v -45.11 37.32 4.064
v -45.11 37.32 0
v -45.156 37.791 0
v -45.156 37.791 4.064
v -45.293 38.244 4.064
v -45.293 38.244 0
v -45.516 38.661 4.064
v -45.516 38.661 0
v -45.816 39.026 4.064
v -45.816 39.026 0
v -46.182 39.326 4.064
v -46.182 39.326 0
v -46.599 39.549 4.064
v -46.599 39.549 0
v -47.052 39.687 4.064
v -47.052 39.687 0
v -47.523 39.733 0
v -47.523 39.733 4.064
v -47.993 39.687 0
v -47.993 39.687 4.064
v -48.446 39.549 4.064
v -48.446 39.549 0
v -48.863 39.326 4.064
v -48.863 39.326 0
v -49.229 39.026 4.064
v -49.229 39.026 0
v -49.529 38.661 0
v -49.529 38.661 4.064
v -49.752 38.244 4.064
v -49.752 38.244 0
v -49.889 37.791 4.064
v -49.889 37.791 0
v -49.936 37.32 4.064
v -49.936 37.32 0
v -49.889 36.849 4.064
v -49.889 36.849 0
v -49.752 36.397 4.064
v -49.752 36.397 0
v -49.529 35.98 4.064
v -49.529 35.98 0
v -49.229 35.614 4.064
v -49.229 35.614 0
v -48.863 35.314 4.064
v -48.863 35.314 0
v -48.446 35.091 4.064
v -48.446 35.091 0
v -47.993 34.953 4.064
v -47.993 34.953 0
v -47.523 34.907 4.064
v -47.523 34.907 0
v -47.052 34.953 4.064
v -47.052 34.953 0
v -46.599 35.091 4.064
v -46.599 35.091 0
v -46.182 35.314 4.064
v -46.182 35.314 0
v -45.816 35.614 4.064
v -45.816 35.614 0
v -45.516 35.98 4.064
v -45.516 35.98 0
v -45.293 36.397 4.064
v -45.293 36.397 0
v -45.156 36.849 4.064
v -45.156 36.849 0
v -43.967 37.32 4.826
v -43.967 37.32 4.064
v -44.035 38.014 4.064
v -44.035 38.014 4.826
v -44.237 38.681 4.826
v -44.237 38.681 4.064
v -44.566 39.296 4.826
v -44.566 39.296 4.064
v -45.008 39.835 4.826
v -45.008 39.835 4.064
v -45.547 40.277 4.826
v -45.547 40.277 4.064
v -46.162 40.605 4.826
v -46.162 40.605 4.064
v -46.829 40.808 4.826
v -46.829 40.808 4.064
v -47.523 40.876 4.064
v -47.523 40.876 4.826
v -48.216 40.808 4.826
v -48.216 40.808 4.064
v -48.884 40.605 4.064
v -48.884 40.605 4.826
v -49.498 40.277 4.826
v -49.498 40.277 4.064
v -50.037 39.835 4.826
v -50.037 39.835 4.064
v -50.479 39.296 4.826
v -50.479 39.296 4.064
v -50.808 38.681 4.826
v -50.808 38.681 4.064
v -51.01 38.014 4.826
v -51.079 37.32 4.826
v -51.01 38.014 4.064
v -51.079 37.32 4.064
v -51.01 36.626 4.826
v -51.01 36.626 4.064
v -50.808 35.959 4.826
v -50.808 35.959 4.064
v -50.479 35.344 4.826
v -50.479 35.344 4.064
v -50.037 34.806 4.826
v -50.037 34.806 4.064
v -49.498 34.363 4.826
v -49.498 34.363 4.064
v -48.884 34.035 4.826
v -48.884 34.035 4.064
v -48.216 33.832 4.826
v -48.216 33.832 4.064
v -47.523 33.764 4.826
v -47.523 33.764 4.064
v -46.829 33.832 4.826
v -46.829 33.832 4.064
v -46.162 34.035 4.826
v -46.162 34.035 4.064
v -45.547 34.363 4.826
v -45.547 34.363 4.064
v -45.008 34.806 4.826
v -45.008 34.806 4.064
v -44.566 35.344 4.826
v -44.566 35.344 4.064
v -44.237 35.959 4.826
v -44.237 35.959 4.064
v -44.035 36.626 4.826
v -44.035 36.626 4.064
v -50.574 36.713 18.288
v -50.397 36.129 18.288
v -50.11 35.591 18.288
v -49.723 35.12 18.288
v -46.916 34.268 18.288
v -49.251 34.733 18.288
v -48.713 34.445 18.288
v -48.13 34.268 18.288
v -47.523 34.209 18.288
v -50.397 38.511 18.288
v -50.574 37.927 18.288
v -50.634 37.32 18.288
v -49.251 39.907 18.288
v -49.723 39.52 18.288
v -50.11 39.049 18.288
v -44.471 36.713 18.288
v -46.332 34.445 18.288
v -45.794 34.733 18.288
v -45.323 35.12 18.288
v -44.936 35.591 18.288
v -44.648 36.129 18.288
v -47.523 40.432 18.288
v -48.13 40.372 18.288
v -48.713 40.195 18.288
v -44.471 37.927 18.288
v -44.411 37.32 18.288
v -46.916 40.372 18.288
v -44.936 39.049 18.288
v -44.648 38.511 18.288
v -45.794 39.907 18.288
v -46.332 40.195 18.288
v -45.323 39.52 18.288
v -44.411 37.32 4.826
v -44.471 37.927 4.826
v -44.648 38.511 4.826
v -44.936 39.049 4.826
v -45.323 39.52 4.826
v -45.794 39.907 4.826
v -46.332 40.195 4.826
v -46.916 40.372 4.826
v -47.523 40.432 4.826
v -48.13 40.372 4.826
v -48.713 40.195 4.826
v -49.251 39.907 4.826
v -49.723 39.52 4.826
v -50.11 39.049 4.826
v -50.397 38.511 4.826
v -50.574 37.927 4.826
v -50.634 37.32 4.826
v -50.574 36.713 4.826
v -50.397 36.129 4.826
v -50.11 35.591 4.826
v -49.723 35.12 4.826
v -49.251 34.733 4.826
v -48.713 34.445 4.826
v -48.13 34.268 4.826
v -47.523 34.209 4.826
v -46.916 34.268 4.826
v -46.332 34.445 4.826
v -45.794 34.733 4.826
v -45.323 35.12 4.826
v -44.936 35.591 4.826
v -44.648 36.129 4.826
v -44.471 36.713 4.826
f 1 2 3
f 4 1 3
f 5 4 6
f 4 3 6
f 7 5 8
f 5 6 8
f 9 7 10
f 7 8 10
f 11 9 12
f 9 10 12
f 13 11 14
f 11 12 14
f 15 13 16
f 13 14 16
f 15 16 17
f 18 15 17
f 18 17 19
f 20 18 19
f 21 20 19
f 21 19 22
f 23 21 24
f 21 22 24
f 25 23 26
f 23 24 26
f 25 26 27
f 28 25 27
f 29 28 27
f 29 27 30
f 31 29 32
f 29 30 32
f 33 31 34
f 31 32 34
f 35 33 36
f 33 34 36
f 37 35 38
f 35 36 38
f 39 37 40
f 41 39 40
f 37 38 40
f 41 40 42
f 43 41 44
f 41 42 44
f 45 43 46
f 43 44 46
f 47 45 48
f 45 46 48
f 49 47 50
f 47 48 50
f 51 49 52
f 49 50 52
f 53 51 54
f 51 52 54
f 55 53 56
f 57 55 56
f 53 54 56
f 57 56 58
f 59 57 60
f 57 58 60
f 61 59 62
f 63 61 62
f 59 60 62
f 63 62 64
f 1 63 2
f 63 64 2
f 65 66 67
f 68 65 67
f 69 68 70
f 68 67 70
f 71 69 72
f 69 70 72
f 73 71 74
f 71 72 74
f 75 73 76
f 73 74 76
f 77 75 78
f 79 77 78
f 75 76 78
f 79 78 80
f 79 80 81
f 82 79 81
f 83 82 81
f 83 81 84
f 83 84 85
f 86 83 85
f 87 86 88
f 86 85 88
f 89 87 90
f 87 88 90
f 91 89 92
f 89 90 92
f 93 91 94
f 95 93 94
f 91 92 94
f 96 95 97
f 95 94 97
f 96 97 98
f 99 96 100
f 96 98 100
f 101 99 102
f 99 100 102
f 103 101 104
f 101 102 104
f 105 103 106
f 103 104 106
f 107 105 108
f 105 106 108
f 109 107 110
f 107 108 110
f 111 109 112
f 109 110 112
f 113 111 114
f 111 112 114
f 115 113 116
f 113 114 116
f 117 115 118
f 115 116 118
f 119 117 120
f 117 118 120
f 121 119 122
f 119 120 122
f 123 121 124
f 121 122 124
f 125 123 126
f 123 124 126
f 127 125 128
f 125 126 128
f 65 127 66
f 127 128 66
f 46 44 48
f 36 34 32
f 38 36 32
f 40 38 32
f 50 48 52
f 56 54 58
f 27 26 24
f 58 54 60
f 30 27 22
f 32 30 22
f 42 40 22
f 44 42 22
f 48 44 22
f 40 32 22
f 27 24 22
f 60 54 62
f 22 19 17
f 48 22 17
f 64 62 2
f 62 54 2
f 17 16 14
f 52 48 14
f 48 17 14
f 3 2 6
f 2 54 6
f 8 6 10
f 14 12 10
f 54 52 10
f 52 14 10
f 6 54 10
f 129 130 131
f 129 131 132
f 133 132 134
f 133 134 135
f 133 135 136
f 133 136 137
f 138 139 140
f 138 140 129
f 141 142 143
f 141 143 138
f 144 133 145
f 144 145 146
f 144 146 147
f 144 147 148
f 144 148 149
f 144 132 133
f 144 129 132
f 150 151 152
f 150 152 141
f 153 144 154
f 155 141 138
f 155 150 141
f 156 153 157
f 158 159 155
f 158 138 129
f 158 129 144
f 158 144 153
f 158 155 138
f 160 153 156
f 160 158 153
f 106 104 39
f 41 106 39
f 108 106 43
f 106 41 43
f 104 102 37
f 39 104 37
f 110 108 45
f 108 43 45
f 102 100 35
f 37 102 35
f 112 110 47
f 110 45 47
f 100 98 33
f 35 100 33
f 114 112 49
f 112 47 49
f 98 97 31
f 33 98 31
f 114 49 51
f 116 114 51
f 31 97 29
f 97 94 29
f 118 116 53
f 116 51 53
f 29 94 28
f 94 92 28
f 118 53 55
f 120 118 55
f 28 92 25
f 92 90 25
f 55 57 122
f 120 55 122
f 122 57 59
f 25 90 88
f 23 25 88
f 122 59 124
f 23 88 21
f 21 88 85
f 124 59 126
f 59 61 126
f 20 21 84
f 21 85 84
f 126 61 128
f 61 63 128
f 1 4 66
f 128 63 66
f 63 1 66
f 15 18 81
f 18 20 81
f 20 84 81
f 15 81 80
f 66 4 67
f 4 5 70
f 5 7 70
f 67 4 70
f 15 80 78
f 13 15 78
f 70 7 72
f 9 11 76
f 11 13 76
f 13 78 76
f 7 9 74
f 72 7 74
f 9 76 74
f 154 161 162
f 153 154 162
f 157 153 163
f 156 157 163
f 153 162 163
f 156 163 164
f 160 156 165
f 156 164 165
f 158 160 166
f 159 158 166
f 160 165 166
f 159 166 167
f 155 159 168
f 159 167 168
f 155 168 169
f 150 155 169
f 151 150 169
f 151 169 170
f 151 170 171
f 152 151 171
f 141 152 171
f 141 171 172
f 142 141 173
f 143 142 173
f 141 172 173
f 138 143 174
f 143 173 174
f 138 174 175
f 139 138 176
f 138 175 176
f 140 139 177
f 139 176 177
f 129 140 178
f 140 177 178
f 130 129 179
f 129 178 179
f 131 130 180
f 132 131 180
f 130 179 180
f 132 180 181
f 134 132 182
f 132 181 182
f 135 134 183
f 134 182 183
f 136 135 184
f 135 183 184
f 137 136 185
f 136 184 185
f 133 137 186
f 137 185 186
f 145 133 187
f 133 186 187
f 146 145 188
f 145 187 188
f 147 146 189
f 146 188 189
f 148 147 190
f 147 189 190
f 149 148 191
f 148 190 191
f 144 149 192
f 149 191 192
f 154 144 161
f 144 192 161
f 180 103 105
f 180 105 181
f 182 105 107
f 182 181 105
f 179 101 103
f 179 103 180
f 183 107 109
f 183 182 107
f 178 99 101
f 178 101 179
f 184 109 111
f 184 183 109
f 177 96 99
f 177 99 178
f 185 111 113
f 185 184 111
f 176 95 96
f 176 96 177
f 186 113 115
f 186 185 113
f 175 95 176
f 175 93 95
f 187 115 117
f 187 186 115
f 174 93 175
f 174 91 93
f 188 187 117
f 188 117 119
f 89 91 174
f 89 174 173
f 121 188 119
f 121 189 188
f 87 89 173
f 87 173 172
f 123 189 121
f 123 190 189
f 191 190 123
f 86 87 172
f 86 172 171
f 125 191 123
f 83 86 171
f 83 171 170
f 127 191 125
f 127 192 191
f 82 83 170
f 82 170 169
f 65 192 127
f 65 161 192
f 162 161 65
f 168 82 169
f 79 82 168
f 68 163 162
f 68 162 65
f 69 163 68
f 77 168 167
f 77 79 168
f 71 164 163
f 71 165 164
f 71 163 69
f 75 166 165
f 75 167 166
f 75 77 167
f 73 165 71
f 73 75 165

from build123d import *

# Parameters (mm, degrees)
F0_R     = 2.413
F1_DEPTH = 4.064
F2_R     = 3.556
F2_R_2   = 2.413
F3_DEPTH = 0.762
F4_R     = 3.1115
F5_DEPTH = 13.462


with BuildPart() as f1:
    # F0 (on Top) → F1 (new body)
    with BuildSketch(Plane.XY):
        with Locations((-47.52272, 37.3201)):
            Circle(F0_R)
    extrude(amount=F1_DEPTH)

    # F2 (on face) → F3 (join)
    with BuildSketch(Plane.XY.offset(4.064)):
        with Locations((-47.52272, 37.3201)):
            Circle(F2_R)
        with Locations((-47.52272, 37.3201)):
            Circle(F2_R_2, mode=Mode.SUBTRACT)
        with Locations((-47.52272, 37.3201)):
            Circle(F2_R_2)
    extrude(amount=F3_DEPTH)

    # F4 (on face) → F5 (join)
    with BuildSketch(Plane.XY.offset(4.826)):
        with Locations((-47.52272, 37.3201)):
            Circle(F4_R)
    extrude(amount=F5_DEPTH)


solid = f1.part
